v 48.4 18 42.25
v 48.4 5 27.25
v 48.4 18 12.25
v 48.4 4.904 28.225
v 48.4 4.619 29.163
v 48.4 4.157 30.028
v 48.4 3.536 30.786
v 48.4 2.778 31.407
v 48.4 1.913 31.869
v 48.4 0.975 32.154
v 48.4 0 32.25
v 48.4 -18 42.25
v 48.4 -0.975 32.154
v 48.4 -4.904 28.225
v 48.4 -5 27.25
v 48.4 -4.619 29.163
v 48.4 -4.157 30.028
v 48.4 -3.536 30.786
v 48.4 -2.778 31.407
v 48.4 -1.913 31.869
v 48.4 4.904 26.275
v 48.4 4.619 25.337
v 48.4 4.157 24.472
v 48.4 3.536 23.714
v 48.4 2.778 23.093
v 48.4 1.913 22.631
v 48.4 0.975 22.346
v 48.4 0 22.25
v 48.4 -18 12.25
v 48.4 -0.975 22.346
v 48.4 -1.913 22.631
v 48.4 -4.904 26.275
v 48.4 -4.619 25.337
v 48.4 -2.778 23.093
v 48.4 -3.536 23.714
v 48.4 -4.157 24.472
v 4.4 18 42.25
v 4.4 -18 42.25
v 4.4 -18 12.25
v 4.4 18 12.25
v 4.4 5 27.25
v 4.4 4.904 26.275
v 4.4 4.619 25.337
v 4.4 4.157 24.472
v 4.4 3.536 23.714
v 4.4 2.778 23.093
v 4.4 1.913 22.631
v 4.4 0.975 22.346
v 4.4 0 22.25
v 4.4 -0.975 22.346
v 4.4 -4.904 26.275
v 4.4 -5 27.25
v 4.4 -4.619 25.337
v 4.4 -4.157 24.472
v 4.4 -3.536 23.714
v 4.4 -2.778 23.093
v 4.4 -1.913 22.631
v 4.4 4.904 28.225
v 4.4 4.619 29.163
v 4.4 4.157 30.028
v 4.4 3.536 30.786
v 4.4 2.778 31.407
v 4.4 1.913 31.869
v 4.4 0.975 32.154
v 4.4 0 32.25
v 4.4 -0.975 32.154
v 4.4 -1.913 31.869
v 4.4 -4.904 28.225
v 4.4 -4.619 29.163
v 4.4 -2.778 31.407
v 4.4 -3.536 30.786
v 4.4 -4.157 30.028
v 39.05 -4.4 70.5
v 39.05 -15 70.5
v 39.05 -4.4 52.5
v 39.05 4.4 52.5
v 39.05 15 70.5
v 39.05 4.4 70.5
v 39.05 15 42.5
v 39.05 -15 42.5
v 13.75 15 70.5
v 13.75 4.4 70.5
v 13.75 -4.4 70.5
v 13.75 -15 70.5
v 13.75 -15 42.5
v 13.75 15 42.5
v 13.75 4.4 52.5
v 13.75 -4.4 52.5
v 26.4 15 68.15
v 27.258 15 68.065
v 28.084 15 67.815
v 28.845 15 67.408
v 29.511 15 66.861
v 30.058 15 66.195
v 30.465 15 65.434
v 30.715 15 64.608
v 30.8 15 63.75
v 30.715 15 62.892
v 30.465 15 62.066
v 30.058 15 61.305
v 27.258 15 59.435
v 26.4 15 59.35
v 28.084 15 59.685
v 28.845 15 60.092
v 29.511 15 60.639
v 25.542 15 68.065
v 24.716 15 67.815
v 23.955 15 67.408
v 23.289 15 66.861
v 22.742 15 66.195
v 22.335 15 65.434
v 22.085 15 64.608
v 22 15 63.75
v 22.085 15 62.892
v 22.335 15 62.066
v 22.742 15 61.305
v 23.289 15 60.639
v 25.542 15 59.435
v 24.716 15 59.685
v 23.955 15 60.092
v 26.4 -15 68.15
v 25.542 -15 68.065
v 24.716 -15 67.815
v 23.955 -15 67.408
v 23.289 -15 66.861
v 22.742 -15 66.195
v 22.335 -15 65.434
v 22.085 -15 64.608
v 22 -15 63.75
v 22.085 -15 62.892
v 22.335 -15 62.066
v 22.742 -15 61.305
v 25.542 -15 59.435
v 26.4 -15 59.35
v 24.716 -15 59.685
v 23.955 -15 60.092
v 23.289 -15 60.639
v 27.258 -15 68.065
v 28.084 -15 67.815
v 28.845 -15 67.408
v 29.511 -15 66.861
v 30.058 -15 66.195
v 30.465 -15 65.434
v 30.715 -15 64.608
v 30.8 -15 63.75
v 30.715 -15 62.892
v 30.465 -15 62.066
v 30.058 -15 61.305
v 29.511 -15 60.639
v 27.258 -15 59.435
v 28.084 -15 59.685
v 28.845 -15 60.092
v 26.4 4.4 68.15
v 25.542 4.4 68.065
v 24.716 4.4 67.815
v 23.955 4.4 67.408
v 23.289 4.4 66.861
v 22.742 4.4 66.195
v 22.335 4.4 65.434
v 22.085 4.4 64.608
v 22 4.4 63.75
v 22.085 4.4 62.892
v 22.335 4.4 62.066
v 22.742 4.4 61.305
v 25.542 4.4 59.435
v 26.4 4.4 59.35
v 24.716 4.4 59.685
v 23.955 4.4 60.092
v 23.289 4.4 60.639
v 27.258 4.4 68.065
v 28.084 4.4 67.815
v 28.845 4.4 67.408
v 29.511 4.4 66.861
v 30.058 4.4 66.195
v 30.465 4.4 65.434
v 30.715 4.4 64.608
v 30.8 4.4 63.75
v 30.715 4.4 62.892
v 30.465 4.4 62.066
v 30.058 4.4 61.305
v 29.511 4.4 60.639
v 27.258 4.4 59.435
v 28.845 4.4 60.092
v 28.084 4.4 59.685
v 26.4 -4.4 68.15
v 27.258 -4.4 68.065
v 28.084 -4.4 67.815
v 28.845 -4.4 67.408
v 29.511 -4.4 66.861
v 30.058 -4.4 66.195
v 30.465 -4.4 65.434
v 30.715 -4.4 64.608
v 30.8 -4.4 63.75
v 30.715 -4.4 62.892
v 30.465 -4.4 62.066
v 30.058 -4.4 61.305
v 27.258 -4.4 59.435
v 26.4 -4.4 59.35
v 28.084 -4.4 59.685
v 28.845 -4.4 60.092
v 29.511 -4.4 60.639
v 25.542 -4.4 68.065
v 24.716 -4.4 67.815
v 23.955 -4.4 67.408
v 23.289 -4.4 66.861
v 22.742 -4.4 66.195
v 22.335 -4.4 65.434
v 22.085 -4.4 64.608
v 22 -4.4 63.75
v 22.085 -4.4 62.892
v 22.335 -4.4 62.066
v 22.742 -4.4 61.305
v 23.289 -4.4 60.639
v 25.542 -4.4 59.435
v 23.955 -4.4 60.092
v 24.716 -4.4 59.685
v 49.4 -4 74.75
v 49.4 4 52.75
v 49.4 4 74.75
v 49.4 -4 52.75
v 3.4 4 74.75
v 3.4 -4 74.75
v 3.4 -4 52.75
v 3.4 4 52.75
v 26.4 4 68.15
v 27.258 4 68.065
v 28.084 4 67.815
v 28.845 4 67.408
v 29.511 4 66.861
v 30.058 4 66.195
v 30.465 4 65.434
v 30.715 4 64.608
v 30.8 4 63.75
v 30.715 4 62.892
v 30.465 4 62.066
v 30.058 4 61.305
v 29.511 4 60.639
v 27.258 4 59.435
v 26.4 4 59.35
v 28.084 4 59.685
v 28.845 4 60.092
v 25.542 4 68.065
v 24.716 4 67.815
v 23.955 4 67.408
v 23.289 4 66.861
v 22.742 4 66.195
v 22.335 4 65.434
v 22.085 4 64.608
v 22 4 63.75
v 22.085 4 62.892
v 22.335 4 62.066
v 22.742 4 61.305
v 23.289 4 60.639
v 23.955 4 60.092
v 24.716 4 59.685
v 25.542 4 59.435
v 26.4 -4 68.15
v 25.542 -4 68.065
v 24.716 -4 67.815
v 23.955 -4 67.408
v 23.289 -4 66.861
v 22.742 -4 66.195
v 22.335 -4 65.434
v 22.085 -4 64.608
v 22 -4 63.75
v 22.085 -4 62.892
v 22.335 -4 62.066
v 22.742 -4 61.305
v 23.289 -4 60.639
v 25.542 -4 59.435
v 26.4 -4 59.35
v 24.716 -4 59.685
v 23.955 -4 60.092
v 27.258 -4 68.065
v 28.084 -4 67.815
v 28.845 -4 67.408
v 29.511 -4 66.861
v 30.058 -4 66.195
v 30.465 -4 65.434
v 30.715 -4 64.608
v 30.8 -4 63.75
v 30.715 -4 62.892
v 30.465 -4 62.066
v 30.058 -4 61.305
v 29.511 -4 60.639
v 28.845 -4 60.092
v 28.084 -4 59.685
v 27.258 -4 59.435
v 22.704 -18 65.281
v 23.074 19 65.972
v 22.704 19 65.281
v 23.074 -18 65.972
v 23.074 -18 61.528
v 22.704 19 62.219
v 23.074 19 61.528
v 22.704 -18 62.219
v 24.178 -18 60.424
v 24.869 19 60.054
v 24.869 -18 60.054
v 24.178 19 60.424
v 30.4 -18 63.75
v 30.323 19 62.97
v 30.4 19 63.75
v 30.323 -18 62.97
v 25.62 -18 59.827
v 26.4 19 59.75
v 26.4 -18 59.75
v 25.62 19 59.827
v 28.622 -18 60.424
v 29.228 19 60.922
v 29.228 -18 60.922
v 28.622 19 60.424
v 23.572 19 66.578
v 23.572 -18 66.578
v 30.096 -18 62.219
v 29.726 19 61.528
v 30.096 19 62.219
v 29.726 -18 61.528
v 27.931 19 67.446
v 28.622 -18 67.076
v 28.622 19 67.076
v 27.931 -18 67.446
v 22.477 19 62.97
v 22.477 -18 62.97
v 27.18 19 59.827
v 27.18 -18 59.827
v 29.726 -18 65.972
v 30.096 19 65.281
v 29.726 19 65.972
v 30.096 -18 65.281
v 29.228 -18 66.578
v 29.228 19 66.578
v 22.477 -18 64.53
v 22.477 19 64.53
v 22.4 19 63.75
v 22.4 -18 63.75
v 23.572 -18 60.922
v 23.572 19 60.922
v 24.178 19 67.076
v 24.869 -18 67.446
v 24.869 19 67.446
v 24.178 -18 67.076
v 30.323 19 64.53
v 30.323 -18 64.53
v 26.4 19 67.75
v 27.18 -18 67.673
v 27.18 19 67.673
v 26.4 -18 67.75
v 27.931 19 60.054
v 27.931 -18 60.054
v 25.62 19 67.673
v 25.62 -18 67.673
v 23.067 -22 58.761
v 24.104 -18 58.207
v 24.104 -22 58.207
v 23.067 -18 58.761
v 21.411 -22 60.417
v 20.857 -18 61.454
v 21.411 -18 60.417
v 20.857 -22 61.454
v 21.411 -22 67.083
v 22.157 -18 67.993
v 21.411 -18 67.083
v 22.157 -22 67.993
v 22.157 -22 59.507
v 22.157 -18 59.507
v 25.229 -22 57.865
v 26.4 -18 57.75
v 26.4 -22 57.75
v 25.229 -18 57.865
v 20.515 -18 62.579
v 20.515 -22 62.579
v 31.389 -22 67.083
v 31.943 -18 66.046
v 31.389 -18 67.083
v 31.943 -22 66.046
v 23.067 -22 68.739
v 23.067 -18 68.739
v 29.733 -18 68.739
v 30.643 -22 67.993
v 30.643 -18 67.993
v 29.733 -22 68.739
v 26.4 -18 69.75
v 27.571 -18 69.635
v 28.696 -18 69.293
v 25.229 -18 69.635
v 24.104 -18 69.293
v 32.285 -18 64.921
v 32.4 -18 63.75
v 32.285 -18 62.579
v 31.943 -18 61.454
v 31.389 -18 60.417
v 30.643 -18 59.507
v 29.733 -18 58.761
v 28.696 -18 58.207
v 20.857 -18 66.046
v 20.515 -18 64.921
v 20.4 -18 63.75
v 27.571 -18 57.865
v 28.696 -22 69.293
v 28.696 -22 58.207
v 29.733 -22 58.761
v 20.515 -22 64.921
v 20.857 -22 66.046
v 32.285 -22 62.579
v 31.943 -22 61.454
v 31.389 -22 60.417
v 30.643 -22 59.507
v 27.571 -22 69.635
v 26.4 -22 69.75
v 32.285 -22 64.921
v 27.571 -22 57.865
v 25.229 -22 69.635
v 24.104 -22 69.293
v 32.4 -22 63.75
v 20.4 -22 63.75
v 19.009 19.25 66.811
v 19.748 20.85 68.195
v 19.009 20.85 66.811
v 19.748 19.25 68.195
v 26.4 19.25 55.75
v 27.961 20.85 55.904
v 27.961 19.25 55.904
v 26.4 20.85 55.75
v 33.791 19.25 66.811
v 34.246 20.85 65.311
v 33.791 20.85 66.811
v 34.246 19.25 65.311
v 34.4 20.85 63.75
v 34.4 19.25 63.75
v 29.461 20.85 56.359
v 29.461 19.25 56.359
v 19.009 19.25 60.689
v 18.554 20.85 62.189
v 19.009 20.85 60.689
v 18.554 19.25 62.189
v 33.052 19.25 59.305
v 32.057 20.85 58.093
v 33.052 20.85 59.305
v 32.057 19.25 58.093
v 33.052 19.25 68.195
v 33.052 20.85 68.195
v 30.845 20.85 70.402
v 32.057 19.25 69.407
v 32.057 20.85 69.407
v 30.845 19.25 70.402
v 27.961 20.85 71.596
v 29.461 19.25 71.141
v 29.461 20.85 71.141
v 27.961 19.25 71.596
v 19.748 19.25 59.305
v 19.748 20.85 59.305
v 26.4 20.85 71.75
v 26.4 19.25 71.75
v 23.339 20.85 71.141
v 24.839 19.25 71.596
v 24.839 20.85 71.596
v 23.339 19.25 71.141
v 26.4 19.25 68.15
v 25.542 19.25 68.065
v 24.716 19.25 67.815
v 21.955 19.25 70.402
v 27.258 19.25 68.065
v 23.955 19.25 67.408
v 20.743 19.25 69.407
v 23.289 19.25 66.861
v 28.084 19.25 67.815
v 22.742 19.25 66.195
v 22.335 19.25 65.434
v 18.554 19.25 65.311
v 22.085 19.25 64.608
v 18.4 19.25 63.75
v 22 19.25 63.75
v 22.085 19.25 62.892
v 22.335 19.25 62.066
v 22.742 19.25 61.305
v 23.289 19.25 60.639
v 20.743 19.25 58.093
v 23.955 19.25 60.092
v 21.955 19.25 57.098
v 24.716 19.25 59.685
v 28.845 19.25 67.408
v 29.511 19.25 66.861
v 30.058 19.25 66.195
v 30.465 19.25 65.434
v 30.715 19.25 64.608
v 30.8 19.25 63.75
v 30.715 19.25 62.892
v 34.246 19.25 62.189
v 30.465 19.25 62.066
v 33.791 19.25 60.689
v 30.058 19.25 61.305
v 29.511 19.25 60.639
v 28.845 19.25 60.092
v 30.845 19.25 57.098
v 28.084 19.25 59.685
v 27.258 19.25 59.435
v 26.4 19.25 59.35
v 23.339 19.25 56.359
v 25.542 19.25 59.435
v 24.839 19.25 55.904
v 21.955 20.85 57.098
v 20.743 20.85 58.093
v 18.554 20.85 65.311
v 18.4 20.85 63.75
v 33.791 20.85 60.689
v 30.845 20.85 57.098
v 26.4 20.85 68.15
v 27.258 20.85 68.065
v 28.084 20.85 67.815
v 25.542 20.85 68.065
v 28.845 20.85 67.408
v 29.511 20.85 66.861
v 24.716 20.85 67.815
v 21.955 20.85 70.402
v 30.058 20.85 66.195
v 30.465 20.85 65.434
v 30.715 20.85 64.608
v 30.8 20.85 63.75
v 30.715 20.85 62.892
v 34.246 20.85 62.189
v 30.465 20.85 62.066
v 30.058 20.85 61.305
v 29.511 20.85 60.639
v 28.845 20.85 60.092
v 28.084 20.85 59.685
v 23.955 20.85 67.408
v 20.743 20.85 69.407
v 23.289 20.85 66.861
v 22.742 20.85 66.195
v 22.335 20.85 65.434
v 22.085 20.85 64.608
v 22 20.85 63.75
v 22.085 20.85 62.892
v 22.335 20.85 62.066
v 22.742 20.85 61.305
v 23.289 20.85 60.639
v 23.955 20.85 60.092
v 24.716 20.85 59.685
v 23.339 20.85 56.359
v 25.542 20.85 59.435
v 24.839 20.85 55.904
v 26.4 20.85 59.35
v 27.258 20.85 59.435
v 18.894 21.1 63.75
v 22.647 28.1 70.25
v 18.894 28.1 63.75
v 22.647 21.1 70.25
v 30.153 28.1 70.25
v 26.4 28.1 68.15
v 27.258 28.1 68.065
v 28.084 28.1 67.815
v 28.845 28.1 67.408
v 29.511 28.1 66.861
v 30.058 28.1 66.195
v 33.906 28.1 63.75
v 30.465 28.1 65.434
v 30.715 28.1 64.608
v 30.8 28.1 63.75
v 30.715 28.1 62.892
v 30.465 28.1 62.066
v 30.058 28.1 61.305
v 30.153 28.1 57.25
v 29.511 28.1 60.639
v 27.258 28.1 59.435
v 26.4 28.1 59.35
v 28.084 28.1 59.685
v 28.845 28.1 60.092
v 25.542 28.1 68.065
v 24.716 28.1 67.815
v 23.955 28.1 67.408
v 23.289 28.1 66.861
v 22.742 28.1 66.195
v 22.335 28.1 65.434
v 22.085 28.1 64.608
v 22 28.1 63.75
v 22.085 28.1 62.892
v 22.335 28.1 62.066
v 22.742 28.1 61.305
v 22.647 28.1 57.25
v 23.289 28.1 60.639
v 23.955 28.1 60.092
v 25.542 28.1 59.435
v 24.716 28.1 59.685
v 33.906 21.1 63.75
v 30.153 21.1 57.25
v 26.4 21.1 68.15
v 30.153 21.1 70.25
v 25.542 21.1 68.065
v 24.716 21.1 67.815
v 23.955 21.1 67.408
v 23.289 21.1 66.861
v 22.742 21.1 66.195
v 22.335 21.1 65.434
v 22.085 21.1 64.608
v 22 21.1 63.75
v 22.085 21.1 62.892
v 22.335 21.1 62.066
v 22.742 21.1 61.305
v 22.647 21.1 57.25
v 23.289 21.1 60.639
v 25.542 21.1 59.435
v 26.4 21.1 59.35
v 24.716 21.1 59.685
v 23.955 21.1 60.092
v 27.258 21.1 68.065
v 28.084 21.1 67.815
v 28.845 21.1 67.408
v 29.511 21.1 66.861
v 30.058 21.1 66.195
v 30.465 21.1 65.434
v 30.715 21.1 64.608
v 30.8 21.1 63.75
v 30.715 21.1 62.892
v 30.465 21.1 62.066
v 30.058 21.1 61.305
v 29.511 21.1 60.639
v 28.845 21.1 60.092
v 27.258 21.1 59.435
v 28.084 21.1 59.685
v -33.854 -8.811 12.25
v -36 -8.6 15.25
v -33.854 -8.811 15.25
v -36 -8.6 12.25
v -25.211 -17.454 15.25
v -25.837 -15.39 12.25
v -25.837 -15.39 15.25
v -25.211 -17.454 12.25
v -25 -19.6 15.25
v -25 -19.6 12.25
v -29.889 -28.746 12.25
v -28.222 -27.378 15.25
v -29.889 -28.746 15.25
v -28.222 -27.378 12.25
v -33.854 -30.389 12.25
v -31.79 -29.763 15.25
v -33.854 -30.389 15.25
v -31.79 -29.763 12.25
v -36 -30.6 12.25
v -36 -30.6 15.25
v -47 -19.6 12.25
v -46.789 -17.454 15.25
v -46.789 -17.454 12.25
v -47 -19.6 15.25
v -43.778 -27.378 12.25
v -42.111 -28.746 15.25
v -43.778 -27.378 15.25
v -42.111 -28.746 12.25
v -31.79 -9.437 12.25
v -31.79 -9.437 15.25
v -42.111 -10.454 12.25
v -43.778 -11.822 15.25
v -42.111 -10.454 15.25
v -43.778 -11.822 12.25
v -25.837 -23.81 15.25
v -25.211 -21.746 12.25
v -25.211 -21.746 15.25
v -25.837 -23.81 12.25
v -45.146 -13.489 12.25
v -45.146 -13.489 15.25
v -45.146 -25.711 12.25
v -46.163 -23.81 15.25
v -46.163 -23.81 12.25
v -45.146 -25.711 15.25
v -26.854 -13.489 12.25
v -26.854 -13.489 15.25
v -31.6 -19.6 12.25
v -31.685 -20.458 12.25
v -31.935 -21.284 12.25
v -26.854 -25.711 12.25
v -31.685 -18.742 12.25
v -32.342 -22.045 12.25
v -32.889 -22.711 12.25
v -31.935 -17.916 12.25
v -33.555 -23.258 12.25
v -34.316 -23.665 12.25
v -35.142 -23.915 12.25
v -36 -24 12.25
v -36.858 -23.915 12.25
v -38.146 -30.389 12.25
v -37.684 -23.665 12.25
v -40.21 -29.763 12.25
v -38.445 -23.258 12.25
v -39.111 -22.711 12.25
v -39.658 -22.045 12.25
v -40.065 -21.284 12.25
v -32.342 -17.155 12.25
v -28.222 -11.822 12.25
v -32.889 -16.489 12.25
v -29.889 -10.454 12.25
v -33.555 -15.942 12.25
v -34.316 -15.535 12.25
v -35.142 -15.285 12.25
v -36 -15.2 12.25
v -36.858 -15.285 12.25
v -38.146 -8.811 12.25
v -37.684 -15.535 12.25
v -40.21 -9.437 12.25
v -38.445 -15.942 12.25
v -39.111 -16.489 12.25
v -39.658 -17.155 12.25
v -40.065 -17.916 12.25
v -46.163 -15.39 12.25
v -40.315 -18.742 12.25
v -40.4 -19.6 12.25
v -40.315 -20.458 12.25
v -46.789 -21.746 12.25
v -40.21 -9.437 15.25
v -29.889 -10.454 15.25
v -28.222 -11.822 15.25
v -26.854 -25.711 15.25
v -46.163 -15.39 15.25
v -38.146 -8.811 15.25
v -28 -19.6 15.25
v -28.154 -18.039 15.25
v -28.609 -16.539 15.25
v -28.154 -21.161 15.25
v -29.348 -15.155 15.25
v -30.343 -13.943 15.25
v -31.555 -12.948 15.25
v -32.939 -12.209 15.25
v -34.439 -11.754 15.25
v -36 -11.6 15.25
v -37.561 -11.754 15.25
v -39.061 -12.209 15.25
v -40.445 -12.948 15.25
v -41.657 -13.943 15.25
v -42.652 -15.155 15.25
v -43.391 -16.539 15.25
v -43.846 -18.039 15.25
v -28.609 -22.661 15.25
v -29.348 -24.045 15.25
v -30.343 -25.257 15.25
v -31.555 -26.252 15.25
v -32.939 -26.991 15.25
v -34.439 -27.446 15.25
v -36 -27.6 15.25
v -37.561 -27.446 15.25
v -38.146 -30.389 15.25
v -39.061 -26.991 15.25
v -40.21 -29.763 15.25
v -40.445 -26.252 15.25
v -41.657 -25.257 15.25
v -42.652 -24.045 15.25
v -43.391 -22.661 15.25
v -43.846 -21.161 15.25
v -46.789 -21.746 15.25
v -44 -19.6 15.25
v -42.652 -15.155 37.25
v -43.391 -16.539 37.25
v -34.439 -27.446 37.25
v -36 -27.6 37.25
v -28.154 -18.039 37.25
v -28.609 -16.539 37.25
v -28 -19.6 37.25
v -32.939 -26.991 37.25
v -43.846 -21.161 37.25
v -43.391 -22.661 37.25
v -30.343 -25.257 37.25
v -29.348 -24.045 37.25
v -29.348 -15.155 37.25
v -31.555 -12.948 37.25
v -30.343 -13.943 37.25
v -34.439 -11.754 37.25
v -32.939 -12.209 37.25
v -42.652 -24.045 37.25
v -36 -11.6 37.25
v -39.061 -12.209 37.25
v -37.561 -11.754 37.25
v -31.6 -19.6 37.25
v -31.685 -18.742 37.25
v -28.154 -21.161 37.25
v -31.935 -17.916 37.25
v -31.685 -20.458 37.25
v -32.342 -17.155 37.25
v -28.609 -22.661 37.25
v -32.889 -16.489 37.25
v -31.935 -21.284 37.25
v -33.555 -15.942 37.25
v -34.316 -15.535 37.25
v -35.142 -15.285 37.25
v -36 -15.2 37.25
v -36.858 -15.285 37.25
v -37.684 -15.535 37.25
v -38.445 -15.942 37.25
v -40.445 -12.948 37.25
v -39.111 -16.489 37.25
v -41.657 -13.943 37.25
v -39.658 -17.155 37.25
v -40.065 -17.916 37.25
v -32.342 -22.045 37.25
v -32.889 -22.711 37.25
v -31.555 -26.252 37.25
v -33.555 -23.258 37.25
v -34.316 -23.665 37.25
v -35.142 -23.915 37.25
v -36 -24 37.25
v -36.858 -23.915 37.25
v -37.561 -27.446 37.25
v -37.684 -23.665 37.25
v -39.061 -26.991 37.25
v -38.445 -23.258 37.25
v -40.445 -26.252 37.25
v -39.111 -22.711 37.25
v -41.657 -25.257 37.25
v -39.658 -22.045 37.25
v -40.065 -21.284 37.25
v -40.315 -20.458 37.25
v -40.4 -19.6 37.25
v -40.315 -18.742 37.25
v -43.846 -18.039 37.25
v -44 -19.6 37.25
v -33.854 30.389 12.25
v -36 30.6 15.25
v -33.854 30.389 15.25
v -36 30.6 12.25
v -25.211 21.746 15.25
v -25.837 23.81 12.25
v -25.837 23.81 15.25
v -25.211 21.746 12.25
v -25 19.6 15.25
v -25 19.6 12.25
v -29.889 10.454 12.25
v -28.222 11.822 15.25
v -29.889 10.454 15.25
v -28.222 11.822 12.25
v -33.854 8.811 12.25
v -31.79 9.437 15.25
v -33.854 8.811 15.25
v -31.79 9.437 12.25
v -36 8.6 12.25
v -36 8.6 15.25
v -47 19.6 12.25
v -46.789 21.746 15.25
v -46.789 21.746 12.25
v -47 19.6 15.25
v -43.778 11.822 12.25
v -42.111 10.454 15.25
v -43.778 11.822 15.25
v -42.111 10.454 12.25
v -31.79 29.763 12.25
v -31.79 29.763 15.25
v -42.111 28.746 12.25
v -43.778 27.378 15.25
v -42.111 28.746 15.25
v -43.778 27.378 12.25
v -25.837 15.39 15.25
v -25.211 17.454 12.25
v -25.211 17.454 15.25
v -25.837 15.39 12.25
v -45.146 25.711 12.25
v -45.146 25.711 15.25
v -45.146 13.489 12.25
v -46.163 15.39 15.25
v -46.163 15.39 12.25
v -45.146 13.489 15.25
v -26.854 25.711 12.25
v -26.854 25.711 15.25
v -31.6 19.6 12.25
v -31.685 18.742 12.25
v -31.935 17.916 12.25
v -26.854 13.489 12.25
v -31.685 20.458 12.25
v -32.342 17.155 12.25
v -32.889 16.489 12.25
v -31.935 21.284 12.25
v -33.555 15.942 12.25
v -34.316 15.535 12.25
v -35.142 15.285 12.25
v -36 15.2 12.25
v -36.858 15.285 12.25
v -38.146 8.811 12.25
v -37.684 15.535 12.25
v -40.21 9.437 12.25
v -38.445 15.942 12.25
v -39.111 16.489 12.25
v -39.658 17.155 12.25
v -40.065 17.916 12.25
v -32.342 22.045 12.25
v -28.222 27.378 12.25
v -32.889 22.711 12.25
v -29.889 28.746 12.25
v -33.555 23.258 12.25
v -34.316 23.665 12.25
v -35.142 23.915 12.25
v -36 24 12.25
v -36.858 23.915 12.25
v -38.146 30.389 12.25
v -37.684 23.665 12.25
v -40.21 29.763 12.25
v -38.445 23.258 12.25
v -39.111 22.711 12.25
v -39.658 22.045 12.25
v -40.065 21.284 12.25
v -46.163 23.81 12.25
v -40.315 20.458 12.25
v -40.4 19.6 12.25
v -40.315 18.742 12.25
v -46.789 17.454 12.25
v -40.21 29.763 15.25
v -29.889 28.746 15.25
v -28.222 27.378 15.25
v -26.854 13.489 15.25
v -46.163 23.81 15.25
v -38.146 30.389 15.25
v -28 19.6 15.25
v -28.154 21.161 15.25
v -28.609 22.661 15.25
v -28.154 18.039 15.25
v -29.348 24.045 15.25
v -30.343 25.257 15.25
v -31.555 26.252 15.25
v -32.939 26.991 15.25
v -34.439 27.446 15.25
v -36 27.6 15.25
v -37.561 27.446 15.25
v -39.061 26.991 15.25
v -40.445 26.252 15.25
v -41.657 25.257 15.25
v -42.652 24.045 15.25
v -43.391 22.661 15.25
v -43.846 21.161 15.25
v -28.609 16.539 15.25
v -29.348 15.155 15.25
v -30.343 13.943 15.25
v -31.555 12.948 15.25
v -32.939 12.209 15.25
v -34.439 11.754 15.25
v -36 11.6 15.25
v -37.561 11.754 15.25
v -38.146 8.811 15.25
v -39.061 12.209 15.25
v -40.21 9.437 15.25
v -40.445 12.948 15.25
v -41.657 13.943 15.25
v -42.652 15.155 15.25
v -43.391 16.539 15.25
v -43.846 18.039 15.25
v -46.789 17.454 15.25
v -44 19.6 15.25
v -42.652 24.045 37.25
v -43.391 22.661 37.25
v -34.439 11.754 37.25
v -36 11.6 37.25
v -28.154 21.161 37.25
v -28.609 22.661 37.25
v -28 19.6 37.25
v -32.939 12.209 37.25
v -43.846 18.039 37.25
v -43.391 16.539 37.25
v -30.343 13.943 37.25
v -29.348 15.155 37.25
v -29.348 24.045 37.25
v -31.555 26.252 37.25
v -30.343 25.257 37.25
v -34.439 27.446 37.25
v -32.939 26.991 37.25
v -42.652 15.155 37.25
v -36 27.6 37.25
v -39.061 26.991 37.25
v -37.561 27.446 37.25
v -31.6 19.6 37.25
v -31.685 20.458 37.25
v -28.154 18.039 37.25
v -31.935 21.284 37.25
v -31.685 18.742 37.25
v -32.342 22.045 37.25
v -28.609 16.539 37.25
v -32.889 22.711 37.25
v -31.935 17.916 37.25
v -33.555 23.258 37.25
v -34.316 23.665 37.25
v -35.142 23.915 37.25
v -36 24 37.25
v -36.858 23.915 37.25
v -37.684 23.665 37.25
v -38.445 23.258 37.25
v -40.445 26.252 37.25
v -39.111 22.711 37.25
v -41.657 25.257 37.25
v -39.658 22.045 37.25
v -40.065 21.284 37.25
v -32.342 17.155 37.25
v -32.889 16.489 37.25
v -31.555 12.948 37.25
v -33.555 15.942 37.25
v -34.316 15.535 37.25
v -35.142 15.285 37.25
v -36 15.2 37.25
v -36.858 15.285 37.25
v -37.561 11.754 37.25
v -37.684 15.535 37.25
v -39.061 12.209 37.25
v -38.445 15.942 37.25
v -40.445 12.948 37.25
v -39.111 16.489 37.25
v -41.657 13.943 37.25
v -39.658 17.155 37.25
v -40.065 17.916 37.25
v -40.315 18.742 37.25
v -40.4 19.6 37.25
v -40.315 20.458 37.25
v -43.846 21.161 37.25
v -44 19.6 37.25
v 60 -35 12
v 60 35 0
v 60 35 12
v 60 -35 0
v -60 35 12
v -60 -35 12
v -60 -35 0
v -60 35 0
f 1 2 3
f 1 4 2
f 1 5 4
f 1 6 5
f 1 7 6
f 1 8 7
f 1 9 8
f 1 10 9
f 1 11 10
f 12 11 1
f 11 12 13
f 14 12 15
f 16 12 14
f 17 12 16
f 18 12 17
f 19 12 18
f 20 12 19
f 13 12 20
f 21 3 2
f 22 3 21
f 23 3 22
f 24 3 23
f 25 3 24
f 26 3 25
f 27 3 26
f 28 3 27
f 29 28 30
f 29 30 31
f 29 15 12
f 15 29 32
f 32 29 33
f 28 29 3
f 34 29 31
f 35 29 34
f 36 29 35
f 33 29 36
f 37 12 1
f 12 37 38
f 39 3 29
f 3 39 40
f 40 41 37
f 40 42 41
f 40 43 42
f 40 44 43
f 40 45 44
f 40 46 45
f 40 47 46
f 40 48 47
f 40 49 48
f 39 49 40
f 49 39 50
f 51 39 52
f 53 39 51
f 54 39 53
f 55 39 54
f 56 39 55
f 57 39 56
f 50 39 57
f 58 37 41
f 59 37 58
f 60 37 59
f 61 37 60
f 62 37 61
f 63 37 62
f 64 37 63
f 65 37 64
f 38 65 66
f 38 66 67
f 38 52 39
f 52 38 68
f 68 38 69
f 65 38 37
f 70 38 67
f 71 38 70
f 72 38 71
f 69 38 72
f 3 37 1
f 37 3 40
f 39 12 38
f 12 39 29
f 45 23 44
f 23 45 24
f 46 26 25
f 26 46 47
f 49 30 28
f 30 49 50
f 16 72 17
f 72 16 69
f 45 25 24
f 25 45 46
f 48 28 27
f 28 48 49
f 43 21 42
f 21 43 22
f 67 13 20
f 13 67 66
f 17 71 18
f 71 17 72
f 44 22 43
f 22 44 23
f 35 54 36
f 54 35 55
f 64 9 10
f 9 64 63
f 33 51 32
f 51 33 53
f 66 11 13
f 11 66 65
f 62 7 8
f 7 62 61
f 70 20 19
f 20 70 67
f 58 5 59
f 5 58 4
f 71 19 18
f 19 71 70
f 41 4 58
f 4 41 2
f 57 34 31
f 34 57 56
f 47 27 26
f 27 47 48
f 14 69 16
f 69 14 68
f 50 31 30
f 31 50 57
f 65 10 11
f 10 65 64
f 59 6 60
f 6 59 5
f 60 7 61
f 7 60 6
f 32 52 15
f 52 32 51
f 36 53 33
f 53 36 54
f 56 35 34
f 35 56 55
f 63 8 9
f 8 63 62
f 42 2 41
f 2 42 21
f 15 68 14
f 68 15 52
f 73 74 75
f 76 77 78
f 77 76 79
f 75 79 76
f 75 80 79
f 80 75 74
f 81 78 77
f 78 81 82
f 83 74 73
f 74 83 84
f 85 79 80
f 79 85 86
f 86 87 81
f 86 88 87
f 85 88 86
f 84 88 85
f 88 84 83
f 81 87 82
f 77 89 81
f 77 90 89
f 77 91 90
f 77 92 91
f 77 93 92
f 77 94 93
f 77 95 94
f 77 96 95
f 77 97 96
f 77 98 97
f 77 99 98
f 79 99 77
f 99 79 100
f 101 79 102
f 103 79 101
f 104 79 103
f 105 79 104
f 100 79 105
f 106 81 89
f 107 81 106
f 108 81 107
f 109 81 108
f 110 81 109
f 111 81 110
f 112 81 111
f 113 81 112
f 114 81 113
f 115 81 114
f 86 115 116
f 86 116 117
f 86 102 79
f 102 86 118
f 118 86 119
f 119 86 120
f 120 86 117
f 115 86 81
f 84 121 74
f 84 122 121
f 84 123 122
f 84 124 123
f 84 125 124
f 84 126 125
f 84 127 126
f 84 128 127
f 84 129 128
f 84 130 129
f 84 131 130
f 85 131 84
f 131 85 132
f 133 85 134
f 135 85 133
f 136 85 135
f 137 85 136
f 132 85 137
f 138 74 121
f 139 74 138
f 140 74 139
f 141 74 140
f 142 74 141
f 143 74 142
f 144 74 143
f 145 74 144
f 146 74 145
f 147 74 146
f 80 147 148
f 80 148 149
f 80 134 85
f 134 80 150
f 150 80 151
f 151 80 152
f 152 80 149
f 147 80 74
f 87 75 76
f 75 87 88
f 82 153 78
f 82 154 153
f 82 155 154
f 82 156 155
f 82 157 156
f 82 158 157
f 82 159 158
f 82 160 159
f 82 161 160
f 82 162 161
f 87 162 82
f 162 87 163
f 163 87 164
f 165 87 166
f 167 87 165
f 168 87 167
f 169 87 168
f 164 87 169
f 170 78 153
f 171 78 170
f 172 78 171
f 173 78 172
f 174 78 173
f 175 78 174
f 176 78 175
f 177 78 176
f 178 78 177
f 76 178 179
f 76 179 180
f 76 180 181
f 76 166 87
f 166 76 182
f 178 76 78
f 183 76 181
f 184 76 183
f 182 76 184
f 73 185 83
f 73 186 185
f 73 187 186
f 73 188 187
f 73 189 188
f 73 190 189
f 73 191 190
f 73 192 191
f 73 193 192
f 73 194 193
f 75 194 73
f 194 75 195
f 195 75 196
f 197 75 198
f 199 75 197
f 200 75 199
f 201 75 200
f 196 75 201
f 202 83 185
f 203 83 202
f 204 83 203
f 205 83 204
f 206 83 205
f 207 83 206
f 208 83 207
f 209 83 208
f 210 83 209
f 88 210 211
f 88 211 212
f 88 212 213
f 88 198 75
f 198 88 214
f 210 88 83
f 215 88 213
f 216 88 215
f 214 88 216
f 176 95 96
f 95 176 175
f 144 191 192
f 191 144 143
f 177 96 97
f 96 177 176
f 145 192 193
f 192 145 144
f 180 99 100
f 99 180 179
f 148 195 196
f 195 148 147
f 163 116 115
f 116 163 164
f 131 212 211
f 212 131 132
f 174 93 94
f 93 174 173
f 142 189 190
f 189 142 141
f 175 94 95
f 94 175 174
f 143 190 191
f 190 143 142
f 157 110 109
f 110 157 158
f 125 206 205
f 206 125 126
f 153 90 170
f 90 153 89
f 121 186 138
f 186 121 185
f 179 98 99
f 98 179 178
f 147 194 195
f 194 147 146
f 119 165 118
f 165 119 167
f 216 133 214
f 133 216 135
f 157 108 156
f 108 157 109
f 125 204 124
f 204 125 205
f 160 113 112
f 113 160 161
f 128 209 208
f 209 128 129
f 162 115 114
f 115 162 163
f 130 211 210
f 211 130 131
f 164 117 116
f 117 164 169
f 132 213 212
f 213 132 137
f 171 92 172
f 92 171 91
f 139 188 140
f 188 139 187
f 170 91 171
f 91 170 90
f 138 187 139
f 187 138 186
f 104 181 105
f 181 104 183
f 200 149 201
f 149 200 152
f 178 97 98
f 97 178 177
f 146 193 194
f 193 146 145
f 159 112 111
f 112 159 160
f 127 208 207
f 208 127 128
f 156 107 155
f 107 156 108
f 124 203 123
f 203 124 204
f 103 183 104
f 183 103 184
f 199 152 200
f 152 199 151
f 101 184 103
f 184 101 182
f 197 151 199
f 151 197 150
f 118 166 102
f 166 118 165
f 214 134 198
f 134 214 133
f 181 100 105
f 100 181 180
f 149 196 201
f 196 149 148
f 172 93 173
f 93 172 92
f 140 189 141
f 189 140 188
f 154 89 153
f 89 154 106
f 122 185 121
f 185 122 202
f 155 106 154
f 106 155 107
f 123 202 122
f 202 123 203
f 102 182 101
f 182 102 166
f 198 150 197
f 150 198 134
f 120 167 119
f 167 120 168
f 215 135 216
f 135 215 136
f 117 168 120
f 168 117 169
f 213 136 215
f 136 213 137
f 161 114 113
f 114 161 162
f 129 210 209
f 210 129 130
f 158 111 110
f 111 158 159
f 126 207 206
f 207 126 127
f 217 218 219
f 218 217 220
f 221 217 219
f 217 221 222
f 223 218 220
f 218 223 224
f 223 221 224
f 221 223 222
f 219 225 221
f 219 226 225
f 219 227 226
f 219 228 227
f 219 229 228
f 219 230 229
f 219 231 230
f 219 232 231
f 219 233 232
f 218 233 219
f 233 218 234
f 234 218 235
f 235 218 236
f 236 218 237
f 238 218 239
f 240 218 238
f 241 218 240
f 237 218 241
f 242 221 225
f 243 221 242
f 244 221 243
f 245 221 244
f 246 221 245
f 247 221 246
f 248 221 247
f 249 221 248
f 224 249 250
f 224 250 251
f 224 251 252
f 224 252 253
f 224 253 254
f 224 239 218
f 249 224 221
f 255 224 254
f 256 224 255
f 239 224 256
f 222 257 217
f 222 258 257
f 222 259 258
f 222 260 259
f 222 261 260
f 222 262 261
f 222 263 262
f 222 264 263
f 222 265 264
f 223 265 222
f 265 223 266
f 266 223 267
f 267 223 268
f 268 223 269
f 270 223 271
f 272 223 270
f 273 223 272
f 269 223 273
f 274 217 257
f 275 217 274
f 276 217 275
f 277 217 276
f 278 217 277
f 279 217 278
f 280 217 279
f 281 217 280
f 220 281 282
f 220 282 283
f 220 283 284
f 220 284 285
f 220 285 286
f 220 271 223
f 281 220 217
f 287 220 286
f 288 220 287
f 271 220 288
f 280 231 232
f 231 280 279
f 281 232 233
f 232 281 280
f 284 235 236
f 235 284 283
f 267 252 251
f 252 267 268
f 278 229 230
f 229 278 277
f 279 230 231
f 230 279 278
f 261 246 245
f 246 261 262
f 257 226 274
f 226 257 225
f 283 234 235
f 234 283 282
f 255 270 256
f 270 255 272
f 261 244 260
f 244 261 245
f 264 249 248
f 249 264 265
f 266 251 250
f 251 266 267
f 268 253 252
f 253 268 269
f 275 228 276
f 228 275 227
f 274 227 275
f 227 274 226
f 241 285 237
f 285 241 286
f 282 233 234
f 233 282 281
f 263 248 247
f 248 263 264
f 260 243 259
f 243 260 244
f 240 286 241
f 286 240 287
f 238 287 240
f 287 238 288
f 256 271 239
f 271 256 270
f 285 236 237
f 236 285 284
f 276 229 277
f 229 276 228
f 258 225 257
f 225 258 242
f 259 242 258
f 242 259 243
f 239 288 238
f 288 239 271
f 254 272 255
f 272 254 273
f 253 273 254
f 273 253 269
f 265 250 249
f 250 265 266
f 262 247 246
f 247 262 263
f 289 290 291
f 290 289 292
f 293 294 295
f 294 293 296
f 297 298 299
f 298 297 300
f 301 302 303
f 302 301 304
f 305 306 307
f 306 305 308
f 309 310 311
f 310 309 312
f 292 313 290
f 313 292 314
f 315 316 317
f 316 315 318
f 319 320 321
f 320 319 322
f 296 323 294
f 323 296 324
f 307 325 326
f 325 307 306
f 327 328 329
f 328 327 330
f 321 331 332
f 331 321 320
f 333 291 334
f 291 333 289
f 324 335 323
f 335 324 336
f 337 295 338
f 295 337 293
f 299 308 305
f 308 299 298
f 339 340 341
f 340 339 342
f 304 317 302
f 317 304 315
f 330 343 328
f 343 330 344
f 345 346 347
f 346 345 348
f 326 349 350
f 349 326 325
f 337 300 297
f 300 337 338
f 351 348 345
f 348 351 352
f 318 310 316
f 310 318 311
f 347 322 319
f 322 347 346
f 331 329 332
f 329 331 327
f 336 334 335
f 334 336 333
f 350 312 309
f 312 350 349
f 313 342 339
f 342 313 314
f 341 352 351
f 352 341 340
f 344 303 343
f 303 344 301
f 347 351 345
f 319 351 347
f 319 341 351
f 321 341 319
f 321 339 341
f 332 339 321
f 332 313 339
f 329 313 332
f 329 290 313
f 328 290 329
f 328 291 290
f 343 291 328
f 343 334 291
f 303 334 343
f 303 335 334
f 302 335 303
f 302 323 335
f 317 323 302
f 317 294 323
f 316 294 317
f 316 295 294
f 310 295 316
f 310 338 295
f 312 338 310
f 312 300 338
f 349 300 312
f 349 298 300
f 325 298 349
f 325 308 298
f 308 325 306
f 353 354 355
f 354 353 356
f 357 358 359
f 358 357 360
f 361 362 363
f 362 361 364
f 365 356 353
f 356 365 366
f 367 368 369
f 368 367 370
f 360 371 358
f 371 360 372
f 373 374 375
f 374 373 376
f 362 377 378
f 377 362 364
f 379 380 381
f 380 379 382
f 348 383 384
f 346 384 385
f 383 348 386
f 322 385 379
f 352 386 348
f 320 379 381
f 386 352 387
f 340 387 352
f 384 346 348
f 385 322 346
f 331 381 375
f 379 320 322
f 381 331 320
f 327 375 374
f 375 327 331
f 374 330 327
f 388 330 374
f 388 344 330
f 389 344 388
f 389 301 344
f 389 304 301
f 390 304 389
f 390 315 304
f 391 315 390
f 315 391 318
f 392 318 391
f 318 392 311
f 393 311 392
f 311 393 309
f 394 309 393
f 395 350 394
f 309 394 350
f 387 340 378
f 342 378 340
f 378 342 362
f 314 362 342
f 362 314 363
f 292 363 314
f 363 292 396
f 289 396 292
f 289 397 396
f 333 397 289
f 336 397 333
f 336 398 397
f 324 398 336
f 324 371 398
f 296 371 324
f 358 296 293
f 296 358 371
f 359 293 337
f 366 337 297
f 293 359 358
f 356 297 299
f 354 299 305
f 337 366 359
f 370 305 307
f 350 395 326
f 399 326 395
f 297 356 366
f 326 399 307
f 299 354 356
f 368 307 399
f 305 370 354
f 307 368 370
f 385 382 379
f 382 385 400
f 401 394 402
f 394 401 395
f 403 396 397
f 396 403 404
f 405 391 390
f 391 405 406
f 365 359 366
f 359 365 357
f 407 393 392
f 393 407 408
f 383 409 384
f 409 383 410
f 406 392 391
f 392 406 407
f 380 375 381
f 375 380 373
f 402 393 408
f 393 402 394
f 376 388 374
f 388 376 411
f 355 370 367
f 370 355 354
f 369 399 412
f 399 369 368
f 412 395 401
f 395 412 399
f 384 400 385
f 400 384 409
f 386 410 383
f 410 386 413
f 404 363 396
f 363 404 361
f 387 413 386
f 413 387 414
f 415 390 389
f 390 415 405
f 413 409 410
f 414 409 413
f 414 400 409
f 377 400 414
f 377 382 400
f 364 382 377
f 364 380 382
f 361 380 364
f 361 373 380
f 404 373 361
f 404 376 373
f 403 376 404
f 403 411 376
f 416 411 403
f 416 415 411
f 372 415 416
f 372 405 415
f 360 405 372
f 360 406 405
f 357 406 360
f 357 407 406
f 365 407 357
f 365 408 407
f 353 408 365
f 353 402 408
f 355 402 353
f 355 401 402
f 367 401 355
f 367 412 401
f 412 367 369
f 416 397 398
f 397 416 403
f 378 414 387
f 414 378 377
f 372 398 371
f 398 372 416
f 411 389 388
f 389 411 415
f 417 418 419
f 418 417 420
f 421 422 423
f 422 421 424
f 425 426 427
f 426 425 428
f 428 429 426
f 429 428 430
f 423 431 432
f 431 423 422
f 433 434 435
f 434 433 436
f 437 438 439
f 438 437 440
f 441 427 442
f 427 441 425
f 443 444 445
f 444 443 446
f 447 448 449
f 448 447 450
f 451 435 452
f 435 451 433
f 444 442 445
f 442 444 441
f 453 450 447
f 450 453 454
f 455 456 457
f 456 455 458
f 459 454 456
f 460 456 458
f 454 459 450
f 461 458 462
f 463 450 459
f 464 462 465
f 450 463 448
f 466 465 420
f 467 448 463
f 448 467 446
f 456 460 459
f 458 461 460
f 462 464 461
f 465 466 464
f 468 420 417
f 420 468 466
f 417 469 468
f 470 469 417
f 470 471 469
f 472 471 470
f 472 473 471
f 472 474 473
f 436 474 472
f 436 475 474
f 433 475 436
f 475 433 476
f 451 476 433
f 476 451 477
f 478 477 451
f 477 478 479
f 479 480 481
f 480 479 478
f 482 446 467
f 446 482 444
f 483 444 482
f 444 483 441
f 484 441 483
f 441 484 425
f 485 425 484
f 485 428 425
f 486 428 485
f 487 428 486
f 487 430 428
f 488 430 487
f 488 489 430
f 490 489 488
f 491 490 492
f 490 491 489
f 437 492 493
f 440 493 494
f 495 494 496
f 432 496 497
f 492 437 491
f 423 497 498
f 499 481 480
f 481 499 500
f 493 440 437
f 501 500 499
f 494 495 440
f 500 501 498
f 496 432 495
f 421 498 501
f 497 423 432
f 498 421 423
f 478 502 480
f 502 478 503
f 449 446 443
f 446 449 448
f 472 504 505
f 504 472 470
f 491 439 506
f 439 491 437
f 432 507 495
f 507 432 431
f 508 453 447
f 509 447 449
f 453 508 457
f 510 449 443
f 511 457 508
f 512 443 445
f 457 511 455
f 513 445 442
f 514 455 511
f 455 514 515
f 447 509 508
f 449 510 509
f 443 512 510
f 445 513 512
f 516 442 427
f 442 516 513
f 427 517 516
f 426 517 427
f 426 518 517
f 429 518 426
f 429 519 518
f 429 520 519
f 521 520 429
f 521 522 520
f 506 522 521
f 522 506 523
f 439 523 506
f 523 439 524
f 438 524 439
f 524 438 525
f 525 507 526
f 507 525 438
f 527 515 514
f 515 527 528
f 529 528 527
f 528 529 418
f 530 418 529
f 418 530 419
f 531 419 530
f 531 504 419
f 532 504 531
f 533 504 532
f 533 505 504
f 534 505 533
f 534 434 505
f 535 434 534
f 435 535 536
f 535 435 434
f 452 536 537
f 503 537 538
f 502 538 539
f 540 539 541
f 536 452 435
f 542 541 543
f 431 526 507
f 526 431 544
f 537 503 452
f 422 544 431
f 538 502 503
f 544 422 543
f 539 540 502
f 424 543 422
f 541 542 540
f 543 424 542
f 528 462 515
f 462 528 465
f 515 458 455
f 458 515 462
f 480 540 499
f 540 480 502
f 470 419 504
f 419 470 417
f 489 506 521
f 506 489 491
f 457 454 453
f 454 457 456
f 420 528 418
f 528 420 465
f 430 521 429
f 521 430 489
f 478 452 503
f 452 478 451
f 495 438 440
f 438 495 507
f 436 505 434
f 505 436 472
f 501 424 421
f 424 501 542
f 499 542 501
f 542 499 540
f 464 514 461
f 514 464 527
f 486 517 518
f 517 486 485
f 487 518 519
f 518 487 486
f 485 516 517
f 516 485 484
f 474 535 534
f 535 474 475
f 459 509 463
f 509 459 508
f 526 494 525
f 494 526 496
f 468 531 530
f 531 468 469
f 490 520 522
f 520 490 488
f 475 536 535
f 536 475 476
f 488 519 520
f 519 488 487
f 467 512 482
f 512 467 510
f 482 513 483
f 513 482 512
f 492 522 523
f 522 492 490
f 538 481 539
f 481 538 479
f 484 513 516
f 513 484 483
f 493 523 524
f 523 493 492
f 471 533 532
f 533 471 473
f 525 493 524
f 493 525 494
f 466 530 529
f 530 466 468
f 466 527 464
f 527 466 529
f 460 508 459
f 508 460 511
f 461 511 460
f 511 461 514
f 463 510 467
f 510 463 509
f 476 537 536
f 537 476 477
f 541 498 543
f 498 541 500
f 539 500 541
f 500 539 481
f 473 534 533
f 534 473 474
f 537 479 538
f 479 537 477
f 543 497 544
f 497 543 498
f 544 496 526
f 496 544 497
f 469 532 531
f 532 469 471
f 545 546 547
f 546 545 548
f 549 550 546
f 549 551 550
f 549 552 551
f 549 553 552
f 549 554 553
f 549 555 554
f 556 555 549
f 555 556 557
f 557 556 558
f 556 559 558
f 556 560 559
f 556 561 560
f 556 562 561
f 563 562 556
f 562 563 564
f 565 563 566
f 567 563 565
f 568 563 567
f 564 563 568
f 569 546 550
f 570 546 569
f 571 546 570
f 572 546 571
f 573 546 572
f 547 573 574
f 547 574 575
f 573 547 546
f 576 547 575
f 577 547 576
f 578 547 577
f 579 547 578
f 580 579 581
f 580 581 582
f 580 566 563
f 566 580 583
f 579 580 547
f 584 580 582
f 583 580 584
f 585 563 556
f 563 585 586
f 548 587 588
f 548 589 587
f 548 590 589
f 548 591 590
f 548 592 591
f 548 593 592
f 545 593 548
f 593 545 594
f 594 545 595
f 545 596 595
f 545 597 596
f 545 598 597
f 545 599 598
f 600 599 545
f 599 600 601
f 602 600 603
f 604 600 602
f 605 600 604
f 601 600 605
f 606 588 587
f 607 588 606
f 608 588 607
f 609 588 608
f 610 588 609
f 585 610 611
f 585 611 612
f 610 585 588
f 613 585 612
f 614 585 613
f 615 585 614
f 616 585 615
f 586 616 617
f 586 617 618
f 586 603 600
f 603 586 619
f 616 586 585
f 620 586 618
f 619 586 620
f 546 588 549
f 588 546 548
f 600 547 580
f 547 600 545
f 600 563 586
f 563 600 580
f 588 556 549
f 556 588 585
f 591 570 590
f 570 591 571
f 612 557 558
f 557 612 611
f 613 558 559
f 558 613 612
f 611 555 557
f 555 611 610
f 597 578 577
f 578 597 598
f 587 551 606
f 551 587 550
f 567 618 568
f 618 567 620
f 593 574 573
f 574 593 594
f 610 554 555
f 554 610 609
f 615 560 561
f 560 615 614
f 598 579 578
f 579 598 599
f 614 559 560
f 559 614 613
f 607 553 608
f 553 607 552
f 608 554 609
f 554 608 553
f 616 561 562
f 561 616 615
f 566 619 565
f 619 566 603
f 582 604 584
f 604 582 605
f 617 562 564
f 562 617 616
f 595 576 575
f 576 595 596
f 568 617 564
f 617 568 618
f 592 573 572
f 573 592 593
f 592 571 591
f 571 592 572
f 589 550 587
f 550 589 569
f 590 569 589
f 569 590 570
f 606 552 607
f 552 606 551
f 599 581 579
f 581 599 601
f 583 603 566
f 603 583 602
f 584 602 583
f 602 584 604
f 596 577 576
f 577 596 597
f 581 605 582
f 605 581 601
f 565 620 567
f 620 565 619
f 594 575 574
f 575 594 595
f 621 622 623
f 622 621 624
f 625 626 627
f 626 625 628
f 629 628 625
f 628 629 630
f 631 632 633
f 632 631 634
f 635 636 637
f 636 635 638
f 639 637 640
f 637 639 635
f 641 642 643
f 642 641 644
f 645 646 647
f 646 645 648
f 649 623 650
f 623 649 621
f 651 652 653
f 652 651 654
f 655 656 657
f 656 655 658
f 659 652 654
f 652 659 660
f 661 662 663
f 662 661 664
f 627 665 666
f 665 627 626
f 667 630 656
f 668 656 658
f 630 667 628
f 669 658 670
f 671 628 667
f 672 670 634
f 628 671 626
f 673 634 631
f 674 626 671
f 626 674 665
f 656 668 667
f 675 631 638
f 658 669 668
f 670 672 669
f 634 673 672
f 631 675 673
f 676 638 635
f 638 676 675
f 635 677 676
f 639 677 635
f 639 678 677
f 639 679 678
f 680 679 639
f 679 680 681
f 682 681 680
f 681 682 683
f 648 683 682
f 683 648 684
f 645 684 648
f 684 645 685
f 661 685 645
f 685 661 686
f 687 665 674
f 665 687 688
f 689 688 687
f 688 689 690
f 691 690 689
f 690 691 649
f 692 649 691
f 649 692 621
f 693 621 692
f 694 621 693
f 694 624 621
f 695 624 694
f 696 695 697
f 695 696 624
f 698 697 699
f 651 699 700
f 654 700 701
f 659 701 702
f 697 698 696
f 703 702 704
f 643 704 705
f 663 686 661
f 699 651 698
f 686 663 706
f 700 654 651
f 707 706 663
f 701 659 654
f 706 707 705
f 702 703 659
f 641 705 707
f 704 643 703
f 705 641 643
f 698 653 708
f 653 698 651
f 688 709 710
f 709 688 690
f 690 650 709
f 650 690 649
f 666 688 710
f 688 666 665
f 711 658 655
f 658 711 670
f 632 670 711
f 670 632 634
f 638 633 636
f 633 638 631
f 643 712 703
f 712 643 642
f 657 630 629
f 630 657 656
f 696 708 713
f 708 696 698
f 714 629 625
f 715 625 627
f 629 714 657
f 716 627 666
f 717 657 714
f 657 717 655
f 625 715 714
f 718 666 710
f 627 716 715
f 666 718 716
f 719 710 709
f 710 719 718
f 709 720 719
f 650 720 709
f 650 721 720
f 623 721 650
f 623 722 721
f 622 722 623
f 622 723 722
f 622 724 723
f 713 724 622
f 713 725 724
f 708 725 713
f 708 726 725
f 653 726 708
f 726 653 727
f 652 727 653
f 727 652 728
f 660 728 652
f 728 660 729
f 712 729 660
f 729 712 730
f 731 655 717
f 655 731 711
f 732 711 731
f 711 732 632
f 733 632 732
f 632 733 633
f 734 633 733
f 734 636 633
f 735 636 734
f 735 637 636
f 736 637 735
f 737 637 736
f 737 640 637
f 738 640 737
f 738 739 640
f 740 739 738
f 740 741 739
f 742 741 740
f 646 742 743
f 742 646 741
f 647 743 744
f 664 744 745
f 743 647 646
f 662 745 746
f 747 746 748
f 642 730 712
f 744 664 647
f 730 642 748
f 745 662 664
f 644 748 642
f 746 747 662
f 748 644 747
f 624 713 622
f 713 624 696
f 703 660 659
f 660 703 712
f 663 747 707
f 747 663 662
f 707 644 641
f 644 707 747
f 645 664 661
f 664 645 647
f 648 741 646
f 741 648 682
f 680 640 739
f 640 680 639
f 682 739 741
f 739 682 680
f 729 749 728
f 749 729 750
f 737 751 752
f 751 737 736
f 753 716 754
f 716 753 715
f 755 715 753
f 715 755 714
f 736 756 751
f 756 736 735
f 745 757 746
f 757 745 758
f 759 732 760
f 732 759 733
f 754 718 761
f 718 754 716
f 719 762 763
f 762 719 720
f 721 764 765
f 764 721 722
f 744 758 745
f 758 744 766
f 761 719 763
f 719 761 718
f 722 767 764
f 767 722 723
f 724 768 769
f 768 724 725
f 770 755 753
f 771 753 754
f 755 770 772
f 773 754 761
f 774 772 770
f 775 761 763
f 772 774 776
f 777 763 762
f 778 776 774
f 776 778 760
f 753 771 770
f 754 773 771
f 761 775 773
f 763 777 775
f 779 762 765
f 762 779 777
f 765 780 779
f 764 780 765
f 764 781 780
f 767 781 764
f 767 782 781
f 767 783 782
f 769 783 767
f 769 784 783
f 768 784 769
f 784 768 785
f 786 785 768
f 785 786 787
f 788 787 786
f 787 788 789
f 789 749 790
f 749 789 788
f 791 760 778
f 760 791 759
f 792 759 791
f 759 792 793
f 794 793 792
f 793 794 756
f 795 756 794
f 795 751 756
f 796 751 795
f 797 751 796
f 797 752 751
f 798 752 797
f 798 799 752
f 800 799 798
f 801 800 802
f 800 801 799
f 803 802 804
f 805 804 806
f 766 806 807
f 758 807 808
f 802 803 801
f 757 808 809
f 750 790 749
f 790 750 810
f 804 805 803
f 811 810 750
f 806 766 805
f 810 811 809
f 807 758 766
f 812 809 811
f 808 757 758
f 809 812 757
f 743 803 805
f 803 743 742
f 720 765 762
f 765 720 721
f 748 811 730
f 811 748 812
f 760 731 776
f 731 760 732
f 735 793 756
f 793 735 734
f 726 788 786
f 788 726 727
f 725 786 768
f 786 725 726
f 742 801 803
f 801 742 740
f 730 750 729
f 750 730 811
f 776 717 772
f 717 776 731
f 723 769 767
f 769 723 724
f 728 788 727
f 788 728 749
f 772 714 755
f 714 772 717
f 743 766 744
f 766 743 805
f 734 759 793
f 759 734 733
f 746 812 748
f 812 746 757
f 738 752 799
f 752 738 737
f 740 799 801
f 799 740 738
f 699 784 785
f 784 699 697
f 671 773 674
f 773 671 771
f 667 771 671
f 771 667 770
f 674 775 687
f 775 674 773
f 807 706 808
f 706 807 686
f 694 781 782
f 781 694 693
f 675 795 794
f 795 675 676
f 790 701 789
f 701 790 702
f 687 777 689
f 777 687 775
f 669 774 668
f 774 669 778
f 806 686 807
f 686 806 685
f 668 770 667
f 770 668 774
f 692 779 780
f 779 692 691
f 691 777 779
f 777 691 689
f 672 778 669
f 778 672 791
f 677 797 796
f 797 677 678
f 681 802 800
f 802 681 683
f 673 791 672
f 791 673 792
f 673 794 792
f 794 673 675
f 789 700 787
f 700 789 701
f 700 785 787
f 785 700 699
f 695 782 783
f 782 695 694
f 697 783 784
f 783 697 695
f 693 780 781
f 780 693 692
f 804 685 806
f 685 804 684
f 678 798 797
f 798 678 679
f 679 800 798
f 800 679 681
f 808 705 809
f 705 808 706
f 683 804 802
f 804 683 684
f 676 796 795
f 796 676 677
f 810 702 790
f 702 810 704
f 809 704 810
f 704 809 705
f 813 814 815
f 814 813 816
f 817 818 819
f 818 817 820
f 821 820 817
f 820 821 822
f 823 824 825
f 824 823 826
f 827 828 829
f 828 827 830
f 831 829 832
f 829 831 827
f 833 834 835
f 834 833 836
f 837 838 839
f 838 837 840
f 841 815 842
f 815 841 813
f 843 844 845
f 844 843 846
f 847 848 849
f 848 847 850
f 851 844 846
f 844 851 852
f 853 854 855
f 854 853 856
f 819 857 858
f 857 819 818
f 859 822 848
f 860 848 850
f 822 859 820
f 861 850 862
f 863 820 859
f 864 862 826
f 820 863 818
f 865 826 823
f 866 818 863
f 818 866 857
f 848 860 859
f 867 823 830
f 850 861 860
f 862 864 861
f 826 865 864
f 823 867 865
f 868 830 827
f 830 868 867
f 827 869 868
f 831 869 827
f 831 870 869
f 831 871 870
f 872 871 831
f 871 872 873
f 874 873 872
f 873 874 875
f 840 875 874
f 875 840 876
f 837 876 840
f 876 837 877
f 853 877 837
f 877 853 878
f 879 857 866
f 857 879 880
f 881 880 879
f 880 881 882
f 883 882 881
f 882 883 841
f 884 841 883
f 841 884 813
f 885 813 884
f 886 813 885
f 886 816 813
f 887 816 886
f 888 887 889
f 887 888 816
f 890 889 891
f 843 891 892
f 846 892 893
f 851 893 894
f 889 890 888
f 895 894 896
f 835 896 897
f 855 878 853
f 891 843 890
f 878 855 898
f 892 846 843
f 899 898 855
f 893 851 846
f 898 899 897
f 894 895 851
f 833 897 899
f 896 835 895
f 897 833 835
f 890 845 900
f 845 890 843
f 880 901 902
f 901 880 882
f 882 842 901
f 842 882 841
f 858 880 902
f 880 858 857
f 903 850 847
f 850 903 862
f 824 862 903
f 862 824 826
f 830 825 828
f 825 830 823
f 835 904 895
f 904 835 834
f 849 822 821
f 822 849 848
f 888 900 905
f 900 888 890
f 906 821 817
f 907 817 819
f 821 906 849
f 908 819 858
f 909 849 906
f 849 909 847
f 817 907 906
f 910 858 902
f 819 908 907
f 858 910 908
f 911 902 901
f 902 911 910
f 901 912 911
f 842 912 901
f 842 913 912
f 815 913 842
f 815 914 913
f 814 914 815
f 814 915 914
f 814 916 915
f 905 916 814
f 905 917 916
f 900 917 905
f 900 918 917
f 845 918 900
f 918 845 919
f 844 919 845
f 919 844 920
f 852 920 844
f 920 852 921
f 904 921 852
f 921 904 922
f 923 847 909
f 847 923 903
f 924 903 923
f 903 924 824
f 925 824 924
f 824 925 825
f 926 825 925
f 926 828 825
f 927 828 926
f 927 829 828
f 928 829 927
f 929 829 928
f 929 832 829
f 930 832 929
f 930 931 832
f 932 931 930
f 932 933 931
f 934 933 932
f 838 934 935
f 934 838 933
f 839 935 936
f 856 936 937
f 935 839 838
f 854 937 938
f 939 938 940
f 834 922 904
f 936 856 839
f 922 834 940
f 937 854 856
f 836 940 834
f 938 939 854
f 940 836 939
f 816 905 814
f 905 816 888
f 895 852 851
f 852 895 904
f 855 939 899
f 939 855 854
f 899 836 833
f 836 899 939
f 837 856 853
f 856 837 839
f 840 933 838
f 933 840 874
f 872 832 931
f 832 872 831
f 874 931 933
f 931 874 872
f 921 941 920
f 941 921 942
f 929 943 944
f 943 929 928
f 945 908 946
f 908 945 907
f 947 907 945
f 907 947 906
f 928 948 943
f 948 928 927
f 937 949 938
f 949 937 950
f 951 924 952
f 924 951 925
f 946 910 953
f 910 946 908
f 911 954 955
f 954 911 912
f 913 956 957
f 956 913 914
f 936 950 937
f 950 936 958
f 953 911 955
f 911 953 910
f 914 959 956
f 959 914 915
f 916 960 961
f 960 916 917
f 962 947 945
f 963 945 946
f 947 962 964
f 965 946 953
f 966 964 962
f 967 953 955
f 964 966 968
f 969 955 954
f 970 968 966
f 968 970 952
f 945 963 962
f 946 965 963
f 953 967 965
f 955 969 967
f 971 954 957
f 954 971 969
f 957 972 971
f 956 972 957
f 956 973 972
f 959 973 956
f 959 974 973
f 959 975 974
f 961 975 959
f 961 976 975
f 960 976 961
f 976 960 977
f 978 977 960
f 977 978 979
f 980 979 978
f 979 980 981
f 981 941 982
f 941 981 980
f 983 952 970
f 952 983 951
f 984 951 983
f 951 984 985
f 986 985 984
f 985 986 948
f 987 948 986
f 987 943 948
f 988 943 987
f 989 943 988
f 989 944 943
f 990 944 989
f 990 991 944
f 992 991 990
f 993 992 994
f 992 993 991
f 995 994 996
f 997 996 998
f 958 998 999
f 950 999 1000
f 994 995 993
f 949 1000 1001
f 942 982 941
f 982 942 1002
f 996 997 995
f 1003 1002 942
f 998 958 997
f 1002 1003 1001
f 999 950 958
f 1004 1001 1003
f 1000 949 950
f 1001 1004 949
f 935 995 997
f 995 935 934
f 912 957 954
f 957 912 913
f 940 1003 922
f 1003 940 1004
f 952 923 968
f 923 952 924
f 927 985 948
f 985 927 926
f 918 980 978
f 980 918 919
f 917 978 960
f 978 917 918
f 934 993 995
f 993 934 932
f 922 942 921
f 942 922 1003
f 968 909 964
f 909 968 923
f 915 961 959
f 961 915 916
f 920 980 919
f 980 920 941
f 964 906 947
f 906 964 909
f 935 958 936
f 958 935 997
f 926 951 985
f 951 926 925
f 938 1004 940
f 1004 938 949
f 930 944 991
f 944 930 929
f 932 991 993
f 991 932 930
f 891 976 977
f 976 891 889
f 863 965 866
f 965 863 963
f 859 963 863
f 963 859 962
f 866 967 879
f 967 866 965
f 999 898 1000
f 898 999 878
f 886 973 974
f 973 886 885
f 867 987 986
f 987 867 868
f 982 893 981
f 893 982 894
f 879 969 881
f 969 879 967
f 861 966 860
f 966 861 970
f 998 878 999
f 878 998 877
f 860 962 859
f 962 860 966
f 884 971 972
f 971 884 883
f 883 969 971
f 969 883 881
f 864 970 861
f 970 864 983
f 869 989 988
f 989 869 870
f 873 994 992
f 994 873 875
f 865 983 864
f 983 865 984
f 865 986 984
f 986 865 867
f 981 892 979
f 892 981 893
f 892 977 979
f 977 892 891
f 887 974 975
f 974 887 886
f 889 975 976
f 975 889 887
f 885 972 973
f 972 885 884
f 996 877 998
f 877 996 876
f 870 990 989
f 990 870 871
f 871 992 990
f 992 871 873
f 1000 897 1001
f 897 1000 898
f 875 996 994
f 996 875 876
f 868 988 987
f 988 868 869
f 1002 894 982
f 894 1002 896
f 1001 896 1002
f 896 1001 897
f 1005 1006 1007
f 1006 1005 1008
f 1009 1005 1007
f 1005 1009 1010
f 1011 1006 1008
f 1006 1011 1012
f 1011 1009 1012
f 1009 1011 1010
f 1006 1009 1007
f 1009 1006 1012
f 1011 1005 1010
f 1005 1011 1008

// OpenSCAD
$fn = 32;

// ------------------------------------------------------------------------
// Indexing jig: plate 120 x 70 mm, pin d8
// Every part is its own module, assembly() places every instance.
// ------------------------------------------------------------------------

// --- part 1 ---
module jig_plate() {
  difference() {
    translate([-60, -35, 0]) cube([120, 70, 12]);
  }
}

// --- part 2 ---
module locator_block() {
  difference() {
    translate([-22, -18, 0]) cube([44, 36, 30]);
    translate([0, 0, 15]) rotate([0, 90, 0]) cylinder(h = 46, d = 10, center = true);
  }
}

// --- part 3 ---
module index_fork() {
  difference() {
    translate([-12.65, -15, 0]) cube([25.3, 30, 28]);
    translate([-13.65, -4.4, 10]) cube([27.3, 8.8, 19]);
    translate([0, 0, 21.25]) rotate([90, 0, 0]) cylinder(h = 32, d = 8.8, center = true);
  }
}

// --- part 4 ---
module index_arm() {
  difference() {
    translate([-23, -4, 0]) cube([46, 8, 22]);
    translate([0, 0, 11]) rotate([90, 0, 0]) cylinder(h = 10, d = 8.8, center = true);
  }
}

// --- part 5 ---
module index_pin() {
  rotate([0, 90, 0]) cylinder(h = 38, d = 8, center = true);
  translate([-22, 0, 0]) rotate([0, 90, 0]) cylinder(h = 4, d = 12);
}

// --- part 6 ---
module pin_washer() {
  difference() {
      translate([0, 0, 0]) cylinder(h = 1.6, d = 16);
      translate([0, 0, -1]) cylinder(h = 3.6, d = 8.8);
    }
}

// --- part 7 ---
module lock_nut() {
  difference() {
    linear_extrude(height = 7) polygon(points = [[7.506, 0], [3.753, 6.5], [-3.753, 6.5], [-7.506, 0], [-3.753, -6.5], [3.753, -6.5]]);
    translate([0, 0, -1]) cylinder(h = 9, d = 8.8);
  }
}

// --- part 8 ---
module guide_bush_a() {
  difference() {
    union() {
      cylinder(h = 3, d = 22);
      translate([0, 0, 3]) cylinder(h = 22, d = 16);
    }
    translate([0, 0, -1]) cylinder(h = 27, d = 8.8);
  }
}

// --- part 9 ---
module guide_bush_b() {
  difference() {
    union() {
      cylinder(h = 3, d = 22);
      translate([0, 0, 3]) cylinder(h = 22, d = 16);
    }
    translate([0, 0, -1]) cylinder(h = 27, d = 8.8);
  }
}

// --- assembly ---
module assembly() {
  color([0.80, 0.24, 0.20]) translate([0, 0, 0]) rotate([0, 0, 0]) jig_plate();
  color([0.20, 0.45, 0.75]) translate([26.4, 0, 12.25]) rotate([0, 0, 0]) locator_block();
  color([0.25, 0.62, 0.32]) translate([26.4, 0, 42.5]) rotate([0, 0, 0]) index_fork();
  color([0.92, 0.70, 0.18]) translate([26.4, 0, 52.75]) rotate([0, 0, 0]) index_arm();
  color([0.58, 0.35, 0.70]) translate([26.4, 0, 63.75]) rotate([0, 0, 90]) index_pin();
  color([0.16, 0.66, 0.66]) translate([26.4, 20.85, 63.75]) rotate([90, 0, 0]) pin_washer();
  color([0.85, 0.48, 0.18]) translate([26.4, 28.1, 63.75]) rotate([90, 0, 0]) lock_nut();
  color([0.55, 0.60, 0.65]) translate([-36, -19.6, 12.25]) rotate([0, 0, 0]) guide_bush_a();
  color([0.75, 0.30, 0.55]) translate([-36, 19.6, 12.25]) rotate([0, 0, 0]) guide_bush_b();
}

assembly();
